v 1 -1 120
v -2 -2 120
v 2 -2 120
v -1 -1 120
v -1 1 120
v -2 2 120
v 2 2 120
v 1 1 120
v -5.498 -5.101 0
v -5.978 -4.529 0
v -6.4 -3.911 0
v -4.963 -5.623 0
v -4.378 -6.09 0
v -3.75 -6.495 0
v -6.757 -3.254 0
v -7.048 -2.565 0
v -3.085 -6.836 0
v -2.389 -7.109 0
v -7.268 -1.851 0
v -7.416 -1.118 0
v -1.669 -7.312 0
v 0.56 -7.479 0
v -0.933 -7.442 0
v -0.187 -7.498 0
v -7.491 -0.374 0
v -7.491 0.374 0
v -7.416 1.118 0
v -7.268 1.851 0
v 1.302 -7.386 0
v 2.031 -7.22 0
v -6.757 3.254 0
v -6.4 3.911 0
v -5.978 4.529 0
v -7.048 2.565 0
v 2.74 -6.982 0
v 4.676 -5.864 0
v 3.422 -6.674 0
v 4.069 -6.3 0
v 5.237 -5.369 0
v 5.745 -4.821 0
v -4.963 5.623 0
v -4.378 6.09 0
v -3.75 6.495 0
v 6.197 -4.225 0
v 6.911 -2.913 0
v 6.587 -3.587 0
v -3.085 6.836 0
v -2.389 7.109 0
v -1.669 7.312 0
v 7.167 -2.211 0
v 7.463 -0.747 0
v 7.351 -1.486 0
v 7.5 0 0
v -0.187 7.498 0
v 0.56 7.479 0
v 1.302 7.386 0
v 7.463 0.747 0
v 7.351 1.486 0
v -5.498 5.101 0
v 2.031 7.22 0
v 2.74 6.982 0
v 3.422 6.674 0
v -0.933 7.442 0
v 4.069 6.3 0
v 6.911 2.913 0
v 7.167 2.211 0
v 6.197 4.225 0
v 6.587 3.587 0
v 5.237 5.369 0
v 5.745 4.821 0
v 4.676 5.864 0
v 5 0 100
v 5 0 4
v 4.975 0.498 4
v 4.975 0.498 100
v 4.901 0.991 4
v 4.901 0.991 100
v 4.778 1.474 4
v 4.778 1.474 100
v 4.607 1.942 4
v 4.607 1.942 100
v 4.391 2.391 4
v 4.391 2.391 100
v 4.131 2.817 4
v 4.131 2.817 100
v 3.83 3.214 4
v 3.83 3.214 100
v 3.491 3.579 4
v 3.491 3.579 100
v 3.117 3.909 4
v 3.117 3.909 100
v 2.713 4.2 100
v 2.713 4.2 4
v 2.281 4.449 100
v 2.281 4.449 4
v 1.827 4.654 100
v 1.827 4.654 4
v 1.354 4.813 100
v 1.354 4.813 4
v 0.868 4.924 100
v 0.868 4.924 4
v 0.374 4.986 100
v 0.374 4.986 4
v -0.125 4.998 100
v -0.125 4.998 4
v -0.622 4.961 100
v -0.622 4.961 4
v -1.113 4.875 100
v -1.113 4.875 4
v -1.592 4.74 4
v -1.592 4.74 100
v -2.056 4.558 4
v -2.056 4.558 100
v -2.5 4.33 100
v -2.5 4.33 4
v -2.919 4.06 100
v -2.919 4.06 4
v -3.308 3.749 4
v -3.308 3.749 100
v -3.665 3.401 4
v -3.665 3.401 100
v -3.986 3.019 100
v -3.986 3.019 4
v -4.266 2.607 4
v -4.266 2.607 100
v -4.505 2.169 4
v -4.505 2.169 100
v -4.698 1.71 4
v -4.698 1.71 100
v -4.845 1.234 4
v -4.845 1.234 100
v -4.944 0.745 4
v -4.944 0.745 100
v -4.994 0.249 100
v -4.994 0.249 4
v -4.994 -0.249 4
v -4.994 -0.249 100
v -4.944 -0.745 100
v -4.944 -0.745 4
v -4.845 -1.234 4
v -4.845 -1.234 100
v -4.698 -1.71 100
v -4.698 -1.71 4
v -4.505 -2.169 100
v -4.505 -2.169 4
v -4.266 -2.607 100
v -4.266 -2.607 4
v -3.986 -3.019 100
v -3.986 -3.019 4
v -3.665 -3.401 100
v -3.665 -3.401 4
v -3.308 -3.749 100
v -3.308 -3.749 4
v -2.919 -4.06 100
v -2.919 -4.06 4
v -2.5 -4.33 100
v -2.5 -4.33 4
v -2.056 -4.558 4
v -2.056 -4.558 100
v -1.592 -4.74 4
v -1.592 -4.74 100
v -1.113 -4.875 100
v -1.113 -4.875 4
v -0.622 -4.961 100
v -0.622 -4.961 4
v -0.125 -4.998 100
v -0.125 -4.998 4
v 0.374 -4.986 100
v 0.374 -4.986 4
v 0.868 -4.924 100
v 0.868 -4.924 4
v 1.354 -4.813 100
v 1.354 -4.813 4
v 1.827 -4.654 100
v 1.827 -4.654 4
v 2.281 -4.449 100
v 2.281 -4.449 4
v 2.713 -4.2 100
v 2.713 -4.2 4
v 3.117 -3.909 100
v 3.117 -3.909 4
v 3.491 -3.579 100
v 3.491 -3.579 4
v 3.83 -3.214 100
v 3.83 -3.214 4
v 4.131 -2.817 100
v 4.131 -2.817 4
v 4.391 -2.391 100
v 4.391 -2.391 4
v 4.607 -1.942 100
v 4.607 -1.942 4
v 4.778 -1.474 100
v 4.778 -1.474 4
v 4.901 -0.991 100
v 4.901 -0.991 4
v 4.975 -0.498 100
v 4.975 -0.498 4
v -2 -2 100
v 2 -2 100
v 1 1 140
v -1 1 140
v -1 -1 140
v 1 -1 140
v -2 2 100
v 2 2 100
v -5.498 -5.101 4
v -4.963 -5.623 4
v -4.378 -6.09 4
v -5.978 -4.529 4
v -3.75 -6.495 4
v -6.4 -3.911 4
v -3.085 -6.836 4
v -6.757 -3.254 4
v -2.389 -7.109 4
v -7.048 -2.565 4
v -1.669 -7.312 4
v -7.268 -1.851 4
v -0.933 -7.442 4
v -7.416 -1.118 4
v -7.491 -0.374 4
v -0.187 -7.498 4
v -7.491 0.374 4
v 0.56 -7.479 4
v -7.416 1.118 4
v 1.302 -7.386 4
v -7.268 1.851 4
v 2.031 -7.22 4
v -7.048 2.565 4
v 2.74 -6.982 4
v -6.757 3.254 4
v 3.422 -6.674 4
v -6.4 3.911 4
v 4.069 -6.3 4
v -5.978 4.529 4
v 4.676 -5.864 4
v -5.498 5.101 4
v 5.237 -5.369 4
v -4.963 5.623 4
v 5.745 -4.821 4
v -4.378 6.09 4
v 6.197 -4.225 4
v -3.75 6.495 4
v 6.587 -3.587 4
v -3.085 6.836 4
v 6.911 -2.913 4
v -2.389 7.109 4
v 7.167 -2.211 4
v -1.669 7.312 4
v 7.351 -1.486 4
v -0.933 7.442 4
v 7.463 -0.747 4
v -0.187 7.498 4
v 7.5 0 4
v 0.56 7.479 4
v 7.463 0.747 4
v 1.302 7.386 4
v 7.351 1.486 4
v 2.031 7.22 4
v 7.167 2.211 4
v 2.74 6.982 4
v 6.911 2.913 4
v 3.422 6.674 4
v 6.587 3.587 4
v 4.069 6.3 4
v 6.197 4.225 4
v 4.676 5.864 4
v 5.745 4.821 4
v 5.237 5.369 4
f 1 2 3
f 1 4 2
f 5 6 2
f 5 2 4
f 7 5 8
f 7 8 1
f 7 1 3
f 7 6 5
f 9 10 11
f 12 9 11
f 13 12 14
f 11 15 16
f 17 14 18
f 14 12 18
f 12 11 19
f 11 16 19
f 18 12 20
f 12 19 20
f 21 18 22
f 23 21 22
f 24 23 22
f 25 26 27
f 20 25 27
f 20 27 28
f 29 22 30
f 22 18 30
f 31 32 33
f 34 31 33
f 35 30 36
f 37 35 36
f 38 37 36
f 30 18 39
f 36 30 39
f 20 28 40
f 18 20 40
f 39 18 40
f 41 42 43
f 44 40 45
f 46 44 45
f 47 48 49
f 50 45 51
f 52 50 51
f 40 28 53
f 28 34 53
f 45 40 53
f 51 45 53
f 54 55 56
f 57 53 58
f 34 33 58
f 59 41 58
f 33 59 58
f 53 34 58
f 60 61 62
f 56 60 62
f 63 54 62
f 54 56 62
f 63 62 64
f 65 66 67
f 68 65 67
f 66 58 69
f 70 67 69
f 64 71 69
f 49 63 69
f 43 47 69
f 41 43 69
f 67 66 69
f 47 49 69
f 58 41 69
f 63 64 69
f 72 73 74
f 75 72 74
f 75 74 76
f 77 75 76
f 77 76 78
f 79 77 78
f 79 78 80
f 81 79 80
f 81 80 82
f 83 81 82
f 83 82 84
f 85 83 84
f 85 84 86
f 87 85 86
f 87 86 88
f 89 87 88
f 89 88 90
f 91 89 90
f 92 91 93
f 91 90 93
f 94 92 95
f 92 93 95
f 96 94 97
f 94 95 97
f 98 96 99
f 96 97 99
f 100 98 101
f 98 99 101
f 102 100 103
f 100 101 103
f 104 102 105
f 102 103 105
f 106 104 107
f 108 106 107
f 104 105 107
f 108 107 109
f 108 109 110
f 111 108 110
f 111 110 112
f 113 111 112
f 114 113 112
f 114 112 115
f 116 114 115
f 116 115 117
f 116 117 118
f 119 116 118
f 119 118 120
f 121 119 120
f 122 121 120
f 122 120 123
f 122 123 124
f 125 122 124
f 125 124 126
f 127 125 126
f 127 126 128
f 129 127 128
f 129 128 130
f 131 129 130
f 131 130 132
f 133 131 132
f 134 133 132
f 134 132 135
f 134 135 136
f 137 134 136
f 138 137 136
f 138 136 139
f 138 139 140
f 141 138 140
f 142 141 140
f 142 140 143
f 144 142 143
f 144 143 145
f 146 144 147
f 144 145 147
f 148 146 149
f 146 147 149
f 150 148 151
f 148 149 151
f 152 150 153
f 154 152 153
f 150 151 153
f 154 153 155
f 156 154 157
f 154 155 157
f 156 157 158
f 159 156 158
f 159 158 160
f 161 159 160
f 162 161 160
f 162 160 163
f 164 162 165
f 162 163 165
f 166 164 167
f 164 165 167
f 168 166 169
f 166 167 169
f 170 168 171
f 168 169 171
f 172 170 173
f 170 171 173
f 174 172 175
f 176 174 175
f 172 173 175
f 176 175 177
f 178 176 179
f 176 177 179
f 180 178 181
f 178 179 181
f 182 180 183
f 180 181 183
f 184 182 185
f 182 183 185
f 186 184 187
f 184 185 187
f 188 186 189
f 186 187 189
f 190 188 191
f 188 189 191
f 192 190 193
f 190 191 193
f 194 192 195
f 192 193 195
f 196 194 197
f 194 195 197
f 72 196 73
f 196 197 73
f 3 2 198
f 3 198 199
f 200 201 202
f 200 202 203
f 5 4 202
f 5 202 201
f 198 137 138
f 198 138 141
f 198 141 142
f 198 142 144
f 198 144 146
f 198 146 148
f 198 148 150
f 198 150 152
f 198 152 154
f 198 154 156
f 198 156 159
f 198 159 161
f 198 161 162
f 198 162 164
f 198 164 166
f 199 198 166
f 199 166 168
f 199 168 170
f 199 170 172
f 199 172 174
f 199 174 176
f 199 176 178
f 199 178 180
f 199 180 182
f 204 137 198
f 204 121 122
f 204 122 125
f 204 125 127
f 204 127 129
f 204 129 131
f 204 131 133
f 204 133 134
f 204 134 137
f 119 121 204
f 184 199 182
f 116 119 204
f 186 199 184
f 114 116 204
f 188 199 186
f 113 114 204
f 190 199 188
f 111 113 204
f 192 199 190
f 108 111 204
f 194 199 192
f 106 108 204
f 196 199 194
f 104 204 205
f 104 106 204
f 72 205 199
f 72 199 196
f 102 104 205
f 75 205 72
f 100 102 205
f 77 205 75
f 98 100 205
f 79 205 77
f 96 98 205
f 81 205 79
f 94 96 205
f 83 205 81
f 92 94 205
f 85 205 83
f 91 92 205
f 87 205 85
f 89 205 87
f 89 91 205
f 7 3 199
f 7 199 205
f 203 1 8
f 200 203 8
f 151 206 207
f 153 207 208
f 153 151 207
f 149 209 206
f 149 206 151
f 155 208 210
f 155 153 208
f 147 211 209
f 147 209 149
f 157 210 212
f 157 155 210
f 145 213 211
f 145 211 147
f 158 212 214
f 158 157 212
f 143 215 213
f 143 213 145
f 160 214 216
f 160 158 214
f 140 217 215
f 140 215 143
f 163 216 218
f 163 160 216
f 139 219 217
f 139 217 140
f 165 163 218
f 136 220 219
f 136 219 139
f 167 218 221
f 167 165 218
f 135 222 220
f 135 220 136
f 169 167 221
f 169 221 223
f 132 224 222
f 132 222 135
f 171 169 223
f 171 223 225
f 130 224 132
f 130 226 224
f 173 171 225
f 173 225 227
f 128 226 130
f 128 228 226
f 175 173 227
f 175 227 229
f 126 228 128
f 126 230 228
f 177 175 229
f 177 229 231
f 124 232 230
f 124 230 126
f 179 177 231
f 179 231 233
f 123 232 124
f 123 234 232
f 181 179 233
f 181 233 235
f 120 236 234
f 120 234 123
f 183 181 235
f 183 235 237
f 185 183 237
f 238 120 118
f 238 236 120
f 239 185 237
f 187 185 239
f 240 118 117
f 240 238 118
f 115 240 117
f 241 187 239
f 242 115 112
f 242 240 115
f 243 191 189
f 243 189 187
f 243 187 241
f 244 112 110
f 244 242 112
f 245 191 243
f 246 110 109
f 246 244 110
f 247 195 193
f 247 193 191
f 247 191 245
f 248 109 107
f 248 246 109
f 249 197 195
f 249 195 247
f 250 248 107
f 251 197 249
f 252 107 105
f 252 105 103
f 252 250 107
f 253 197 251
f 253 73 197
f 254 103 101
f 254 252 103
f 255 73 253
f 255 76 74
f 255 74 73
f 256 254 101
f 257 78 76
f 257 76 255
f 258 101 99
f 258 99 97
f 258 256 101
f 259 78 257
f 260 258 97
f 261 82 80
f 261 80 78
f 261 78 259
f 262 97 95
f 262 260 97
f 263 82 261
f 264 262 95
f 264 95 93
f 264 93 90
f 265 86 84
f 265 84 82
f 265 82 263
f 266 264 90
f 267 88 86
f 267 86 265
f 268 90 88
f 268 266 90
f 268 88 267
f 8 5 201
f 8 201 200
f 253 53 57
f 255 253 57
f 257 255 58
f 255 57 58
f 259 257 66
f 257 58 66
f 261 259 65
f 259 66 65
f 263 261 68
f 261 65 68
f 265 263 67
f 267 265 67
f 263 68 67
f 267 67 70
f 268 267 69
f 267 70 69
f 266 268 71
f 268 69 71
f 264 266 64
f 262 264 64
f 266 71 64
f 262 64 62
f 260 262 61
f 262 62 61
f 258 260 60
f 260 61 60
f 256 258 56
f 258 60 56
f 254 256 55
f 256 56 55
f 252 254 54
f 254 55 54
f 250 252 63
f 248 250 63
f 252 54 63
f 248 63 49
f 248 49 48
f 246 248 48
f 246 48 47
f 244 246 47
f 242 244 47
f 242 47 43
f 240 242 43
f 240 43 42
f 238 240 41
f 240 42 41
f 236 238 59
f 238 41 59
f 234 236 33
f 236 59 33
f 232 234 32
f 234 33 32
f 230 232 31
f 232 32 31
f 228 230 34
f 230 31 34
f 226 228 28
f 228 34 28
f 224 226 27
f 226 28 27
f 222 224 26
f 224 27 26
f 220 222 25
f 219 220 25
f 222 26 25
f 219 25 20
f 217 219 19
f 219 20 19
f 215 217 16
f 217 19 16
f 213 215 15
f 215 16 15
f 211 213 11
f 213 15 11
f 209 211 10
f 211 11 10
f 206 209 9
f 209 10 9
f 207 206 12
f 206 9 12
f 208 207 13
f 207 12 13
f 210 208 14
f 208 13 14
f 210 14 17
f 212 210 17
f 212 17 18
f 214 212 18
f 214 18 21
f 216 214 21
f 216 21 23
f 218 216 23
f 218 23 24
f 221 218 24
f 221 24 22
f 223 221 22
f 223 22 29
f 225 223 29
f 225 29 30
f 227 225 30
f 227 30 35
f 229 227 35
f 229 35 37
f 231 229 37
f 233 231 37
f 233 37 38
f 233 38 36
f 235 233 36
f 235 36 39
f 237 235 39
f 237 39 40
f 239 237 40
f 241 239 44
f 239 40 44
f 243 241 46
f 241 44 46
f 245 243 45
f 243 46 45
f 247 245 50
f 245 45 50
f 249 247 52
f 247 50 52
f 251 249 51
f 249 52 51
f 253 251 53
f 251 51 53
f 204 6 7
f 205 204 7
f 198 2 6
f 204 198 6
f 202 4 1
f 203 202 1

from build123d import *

# Parameters (mm, degrees)
F0_R     = 7.5
F1_DEPTH = 4
F2_R     = 5
F3_DEPTH = 100
F4_W     = 4
F4_H     = 4
F5_DEPTH = 20
F6_W     = 2
F6_H     = 2
F7_DEPTH = 20


with BuildPart() as f1:
    # F0 (on Top) → F1 (new body)
    with BuildSketch(Plane.XY):
        Circle(F0_R)
    extrude(amount=F1_DEPTH)

    # F2 (on Top) → F3 (join)
    with BuildSketch(Plane.XY):
        Circle(F2_R)
    extrude(amount=F3_DEPTH)

    # F4 (on face) → F5 (join)
    with BuildSketch(Plane.XY.offset(100)):
        Rectangle(F4_W, F4_H)
    extrude(amount=F5_DEPTH)

    # F6 (on face) → F7 (join)
    with BuildSketch(Plane.XY.offset(120)):
        Rectangle(F6_W, F6_H)
    extrude(amount=F7_DEPTH)


solid = f1.part
